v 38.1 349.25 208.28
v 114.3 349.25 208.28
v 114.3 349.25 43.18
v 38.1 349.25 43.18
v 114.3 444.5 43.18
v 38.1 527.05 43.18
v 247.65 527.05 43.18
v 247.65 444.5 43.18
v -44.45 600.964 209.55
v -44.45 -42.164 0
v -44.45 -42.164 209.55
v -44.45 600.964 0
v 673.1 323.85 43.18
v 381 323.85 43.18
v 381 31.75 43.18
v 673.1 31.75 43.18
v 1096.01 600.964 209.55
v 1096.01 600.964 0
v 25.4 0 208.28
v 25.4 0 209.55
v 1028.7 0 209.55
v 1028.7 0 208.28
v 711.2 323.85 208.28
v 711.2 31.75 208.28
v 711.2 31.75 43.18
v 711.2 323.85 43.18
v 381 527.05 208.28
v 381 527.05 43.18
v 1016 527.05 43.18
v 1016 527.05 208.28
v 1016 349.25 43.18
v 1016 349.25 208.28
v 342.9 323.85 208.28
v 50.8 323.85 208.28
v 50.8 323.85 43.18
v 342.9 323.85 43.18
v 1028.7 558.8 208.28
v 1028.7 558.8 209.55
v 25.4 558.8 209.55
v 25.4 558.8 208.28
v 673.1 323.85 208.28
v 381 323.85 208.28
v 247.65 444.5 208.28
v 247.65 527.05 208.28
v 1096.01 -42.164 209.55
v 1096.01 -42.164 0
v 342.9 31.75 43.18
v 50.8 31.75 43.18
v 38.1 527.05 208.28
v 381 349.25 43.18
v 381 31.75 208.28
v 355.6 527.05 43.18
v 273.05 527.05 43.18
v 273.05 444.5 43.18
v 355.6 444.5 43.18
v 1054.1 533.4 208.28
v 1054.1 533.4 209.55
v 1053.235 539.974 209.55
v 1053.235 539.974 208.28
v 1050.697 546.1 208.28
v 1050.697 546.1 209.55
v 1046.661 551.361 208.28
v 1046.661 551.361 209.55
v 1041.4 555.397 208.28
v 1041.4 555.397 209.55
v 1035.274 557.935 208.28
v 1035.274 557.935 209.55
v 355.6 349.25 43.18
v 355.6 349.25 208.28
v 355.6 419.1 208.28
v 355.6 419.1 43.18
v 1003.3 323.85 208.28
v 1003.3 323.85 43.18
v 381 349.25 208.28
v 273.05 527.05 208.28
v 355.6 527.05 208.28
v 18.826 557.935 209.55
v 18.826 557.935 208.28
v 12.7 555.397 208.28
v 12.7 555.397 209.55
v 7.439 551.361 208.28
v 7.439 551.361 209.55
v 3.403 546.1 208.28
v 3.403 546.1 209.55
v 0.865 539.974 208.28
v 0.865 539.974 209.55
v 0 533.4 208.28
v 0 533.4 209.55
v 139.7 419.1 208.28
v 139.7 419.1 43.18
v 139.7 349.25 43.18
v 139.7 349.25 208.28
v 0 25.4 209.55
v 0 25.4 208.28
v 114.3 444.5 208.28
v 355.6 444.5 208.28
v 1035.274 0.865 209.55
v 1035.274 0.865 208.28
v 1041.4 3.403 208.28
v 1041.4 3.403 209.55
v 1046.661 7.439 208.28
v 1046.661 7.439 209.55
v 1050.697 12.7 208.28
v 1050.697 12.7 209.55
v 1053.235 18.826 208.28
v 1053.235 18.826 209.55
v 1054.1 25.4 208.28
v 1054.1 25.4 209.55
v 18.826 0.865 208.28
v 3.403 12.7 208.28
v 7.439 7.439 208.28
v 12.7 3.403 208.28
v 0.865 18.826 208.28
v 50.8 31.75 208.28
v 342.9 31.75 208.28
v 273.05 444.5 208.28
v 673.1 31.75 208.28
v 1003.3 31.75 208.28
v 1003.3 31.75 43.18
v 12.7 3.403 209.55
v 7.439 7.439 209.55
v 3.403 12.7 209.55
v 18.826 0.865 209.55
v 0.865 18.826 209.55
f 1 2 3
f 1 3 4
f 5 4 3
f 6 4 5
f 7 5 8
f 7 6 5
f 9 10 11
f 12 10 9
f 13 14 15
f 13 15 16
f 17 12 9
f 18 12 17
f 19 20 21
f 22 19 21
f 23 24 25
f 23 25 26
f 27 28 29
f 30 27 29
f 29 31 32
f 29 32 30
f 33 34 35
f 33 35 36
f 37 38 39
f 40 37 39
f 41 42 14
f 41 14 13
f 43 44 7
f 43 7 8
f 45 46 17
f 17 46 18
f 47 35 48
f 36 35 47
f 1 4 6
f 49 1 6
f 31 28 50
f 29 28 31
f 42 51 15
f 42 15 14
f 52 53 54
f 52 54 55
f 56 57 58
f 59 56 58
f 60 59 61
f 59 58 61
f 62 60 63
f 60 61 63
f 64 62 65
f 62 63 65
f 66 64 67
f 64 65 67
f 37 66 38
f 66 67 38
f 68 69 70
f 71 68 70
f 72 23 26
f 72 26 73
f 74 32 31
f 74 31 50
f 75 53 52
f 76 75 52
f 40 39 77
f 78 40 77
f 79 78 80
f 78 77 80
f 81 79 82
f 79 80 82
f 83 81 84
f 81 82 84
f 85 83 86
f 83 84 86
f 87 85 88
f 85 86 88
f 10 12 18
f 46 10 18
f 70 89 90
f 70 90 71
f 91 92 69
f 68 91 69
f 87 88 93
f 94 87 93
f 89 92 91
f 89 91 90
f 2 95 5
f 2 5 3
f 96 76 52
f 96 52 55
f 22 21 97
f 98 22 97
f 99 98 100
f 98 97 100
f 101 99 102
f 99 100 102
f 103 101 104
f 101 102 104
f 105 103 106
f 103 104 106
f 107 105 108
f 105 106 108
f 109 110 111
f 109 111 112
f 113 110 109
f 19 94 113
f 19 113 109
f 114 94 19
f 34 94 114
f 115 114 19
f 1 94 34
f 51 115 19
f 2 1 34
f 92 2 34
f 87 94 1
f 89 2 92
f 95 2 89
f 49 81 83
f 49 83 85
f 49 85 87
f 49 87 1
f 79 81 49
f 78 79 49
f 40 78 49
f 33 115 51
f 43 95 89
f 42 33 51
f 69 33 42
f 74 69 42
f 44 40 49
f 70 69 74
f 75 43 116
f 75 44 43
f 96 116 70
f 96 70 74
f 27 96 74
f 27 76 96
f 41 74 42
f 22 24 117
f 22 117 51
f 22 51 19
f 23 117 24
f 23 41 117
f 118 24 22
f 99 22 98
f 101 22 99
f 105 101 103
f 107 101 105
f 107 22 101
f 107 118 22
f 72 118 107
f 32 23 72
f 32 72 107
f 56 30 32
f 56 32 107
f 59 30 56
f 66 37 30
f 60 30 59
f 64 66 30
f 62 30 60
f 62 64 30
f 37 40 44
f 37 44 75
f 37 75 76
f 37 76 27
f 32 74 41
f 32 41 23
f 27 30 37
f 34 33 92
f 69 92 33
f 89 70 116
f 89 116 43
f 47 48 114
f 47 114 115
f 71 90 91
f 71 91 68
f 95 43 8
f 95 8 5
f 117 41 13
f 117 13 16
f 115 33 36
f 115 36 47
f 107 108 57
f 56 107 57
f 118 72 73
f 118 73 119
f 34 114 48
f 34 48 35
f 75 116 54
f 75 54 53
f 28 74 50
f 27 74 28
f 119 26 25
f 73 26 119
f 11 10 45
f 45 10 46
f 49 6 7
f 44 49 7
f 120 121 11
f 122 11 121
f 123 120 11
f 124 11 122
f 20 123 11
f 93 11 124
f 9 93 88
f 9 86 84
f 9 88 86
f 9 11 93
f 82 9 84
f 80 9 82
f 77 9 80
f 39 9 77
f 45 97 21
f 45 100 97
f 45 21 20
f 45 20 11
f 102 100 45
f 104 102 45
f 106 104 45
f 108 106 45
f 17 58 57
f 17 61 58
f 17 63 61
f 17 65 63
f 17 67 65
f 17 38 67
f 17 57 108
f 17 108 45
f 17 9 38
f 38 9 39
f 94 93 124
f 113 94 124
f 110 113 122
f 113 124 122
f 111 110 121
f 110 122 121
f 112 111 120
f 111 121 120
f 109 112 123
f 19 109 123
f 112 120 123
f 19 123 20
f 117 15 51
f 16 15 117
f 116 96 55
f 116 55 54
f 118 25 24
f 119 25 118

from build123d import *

# Parameters (mm, degrees)
F0_W     = 1140.46
F0_H     = 643.128
F1_DEPTH = 209.55
F3_DEPTH = 191.77
F4_W     = 977.9
F4_H     = 495.3
F5_DEPTH = 190.5
F6_DEPTH = 25.4
F7_W     = 215.9
F7_H     = 69.85
F8_DEPTH = 165.1


with BuildPart() as f1:
    # F0 (on Top) → F1 (new body)
    with BuildSketch(Plane.XY):
        with Locations((525.78, 279.4)):
            Rectangle(F0_W, F0_H)
    extrude(amount=F1_DEPTH)

    # F2 (on face) → F3 (cut)
    with BuildSketch(Plane.XY.offset(209.55)):
        with BuildLine():
            ThreePointArc((0, 25.4), (7.4394877579, 7.4394877579), (25.4, 0))
            Line((25.4, 0), (1028.7, 0))
            ThreePointArc((1028.7, 0), (1046.6605122421, 7.4394877579), (1054.1, 25.4))
            Line((1054.1, 25.4), (1054.1, 533.4))
            ThreePointArc((1054.1, 533.4), (1046.6605122421, 551.3605122421), (1028.7, 558.8))
            Line((1028.7, 558.8), (25.4, 558.8))
            ThreePointArc((25.4, 558.8), (7.4394877579, 551.3605122421), (0, 533.4))
            Line((0, 533.4), (0, 25.4))
        make_face()
    extrude(amount=-F3_DEPTH, mode=Mode.SUBTRACT)

    # F4 (on face) → F5 (join)
    with BuildSketch(Plane.XY.offset(17.78)):
        with BuildLine():
            ThreePointArc((0, 25.4), (7.4394877579, 7.4394877579), (25.4, 0))
            Line((25.4, 0), (1028.7, 0))
            ThreePointArc((1028.7, 0), (1046.6605122421, 7.4394877579), (1054.1, 25.4))
            Line((1054.1, 25.4), (1054.1, 533.4))
            ThreePointArc((1054.1, 533.4), (1046.6605122421, 551.3605122421), (1028.7, 558.8))
            Line((1028.7, 558.8), (25.4, 558.8))
            ThreePointArc((25.4, 558.8), (7.4394877579, 551.3605122421), (0, 533.4))
            Line((0, 533.4), (0, 25.4))
        make_face()
        with Locations((527.05, 279.4)):
            Rectangle(F4_W, F4_H, mode=Mode.SUBTRACT)
    extrude(amount=F5_DEPTH)

    # F6 (add): a face of the model
    f6_faces = [f1.faces().sort_by_distance(p)[0] for p in [
        (527.05, 279.4, 17.78),
    ]]
    extrude(f6_faces, amount=F6_DEPTH)

    # F7 (on face) → F8 (join)
    with BuildSketch(Plane.XY.offset(208.28)):
        Polygon((1003.3, 31.75), (1016, 31.75), (1016, 323.85), (1016, 349.25), (381, 349.25), (381, 527.05), (355.6, 527.05), (355.6, 444.5), (273.05, 444.5), (273.05, 527.05), (247.65, 527.05), (247.65, 444.5), (114.3, 444.5), (114.3, 349.25), (38.1, 349.25), (38.1, 323.85), (38.1, 31.75), (50.8, 31.75), (50.8, 323.85), (342.9, 323.85), (342.9, 31.75), (381, 31.75), (381, 323.85), (673.1, 323.85), (673.1, 31.75), (711.2, 31.75), (711.2, 323.85), (1003.3, 323.85), align=None)
        with Locations((247.65, 384.175)):
            Rectangle(F7_W, F7_H, mode=Mode.SUBTRACT)
    extrude(amount=-F8_DEPTH)


solid = f1.part
